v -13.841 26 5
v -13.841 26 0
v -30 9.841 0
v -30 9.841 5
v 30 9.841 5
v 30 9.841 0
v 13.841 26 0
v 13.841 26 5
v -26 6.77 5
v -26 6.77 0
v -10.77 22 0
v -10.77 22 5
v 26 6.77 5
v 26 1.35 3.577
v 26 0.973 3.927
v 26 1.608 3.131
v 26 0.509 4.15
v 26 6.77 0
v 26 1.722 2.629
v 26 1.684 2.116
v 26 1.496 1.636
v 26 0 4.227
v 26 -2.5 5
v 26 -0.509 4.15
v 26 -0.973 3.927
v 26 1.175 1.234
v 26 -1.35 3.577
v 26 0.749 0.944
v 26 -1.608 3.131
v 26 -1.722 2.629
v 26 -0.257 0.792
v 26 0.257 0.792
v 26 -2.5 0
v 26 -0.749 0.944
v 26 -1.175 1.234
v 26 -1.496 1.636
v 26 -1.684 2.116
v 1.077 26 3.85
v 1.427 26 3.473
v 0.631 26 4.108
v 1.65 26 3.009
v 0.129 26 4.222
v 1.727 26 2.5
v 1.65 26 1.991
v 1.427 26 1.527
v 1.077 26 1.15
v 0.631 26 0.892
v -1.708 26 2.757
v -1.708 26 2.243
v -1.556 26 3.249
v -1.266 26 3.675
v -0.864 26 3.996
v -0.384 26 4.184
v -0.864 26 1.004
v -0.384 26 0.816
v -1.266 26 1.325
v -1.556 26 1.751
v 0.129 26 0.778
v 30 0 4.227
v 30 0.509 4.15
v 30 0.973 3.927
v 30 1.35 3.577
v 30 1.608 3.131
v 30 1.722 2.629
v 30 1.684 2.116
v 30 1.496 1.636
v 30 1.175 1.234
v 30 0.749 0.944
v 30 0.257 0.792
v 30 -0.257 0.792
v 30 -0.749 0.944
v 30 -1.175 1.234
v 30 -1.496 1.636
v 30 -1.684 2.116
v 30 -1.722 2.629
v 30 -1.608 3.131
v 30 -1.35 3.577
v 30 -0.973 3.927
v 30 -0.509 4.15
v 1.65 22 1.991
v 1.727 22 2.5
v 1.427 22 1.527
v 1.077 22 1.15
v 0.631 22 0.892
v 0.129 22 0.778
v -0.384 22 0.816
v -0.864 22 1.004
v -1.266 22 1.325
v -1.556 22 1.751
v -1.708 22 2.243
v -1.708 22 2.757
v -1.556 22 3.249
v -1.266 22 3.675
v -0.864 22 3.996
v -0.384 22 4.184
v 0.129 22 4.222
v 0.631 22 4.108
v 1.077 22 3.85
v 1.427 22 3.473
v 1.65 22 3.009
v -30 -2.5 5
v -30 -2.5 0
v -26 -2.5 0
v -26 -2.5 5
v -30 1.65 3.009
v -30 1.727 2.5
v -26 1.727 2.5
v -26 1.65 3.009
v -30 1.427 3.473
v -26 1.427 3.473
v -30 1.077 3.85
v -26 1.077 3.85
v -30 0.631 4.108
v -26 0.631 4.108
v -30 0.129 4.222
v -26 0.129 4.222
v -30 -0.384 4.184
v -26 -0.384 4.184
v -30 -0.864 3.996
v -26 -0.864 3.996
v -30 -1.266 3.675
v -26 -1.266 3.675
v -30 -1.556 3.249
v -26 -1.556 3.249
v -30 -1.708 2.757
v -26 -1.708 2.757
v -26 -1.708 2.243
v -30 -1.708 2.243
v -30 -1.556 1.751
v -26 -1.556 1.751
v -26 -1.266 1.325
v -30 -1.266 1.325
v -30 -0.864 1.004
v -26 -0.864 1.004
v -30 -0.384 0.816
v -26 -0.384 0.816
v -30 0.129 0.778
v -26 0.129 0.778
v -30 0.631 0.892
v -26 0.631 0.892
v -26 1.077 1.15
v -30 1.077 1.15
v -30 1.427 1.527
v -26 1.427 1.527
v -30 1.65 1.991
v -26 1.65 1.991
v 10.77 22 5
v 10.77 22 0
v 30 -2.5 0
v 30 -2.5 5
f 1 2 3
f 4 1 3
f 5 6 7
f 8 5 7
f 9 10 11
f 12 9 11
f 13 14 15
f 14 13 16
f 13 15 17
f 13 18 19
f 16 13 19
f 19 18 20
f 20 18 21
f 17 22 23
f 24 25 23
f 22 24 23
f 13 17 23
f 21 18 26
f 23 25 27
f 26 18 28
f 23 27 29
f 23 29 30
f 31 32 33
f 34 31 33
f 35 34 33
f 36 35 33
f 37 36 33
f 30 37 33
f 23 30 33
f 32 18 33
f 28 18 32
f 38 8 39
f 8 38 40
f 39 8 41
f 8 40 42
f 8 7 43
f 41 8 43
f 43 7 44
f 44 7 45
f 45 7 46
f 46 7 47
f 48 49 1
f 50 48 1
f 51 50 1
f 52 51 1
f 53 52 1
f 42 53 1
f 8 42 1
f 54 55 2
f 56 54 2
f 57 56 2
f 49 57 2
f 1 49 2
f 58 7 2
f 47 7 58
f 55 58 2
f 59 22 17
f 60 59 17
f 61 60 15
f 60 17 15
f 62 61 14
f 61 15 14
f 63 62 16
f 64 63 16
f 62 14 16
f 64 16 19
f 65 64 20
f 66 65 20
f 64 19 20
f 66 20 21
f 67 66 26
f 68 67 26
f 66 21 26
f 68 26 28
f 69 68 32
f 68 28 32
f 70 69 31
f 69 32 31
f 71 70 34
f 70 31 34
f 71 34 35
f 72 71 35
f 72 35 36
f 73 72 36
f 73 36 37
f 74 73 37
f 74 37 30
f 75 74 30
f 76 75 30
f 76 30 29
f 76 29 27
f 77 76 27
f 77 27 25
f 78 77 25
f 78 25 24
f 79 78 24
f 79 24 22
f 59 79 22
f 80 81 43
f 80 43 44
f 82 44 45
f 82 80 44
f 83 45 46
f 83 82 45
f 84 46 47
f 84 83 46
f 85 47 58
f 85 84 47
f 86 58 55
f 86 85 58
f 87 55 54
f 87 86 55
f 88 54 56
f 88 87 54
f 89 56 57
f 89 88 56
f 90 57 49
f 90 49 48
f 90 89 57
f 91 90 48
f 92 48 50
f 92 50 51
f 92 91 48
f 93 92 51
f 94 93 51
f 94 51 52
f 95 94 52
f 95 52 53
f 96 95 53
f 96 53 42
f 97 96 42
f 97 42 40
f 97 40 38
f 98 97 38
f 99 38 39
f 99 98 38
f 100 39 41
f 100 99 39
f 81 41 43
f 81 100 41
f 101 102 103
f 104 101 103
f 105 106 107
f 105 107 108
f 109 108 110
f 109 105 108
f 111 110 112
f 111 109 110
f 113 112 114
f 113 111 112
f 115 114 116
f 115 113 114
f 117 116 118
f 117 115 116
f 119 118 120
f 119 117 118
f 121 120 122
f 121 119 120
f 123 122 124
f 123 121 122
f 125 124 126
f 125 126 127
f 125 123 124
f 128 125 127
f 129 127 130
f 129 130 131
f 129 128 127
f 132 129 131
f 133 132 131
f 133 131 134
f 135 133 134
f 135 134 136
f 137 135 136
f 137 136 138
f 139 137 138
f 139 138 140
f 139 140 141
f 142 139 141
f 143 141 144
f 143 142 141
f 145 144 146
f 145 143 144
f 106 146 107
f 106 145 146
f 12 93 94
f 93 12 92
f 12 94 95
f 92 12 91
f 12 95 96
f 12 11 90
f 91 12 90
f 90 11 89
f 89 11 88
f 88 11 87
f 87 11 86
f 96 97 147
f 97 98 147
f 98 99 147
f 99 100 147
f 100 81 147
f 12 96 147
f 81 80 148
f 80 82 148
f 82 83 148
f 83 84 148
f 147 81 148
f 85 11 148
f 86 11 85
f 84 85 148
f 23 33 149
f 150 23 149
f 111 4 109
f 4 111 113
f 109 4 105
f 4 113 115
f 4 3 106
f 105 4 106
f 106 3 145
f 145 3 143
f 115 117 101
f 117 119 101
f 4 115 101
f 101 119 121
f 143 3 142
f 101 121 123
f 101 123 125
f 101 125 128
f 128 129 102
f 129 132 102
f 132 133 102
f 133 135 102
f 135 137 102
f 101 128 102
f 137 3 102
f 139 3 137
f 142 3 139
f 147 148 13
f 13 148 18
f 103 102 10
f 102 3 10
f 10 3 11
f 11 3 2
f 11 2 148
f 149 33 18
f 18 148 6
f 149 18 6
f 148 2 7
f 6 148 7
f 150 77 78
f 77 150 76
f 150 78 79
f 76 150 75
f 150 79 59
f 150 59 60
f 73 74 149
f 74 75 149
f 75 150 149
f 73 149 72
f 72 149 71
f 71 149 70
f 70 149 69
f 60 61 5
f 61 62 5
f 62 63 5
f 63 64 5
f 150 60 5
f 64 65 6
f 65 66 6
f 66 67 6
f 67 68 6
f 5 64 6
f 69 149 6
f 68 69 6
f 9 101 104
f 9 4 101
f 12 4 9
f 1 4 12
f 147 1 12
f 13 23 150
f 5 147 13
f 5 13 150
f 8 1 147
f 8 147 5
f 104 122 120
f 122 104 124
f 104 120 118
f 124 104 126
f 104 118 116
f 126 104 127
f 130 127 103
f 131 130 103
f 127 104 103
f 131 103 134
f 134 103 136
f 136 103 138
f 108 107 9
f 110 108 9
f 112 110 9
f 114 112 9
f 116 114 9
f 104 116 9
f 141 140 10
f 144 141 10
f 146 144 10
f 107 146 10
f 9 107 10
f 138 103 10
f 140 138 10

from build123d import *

# Parameters (mm, degrees)
BOSS_EXTRUDE1_DEPTH             = 5
F_29_0_136_DIAMETER_HOLE1_D     = 3.4544
F_29_0_136_DIAMETER_HOLE1_DEPTH = 4
CIRPATTERN1_START               = -30
CIRPATTERN1_OUTLINE_R           = 1.7272
CIRPATTERN1_DEPTH               = 4
CIRPATTERN1_START_2             = 22
CIRPATTERN1_2_OUTLINE_R         = 1.7272
CIRPATTERN1_2_DEPTH             = 4


# Read off the part's stored shape, not the designer's step: CirPattern1
with BuildPart() as part:
    # Sketch1 → Boss-Extrude1 (new body)
    with BuildSketch(Plane.XY):
        Polygon((-30, -2.5), (-26, -2.5), (-26, 6.769552622), (-10.769552622, 22), (10.769552622, 22), (26, 6.769552622), (26, -2.5), (30, -2.5), (30, 9.840620434), (13.840620434, 26), (-13.840620434, 26), (-30, 9.840620434), align=None)
    extrude(amount=BOSS_EXTRUDE1_DEPTH)

    # #29 (0.136) Diameter Hole1
    with Locations(Plane(origin=(30, 0, 0), x_dir=(0, 0, -1), z_dir=(1, 0, 0))):
        with Locations((-2.5, 0)):
            Hole(F_29_0_136_DIAMETER_HOLE1_D / 2, depth=F_29_0_136_DIAMETER_HOLE1_DEPTH)

    # CirPattern1 outline → CirPattern1 (cut)
    with BuildSketch(Plane.YZ.offset(CIRPATTERN1_START)):
        with Locations((0, 2.5)):
            Circle(CIRPATTERN1_OUTLINE_R)
    extrude(amount=CIRPATTERN1_DEPTH, mode=Mode.SUBTRACT)

    # CirPattern1 2 outline → CirPattern1 2 (cut)
    with BuildSketch(Plane(origin=(0, 0, 0), x_dir=(1, 0, 0), z_dir=(0, 1, 0)).offset(CIRPATTERN1_START_2)):
        with Locations((0, -2.5)):
            Circle(CIRPATTERN1_2_OUTLINE_R)
    extrude(amount=CIRPATTERN1_2_DEPTH, mode=Mode.SUBTRACT)


solid = part.part
